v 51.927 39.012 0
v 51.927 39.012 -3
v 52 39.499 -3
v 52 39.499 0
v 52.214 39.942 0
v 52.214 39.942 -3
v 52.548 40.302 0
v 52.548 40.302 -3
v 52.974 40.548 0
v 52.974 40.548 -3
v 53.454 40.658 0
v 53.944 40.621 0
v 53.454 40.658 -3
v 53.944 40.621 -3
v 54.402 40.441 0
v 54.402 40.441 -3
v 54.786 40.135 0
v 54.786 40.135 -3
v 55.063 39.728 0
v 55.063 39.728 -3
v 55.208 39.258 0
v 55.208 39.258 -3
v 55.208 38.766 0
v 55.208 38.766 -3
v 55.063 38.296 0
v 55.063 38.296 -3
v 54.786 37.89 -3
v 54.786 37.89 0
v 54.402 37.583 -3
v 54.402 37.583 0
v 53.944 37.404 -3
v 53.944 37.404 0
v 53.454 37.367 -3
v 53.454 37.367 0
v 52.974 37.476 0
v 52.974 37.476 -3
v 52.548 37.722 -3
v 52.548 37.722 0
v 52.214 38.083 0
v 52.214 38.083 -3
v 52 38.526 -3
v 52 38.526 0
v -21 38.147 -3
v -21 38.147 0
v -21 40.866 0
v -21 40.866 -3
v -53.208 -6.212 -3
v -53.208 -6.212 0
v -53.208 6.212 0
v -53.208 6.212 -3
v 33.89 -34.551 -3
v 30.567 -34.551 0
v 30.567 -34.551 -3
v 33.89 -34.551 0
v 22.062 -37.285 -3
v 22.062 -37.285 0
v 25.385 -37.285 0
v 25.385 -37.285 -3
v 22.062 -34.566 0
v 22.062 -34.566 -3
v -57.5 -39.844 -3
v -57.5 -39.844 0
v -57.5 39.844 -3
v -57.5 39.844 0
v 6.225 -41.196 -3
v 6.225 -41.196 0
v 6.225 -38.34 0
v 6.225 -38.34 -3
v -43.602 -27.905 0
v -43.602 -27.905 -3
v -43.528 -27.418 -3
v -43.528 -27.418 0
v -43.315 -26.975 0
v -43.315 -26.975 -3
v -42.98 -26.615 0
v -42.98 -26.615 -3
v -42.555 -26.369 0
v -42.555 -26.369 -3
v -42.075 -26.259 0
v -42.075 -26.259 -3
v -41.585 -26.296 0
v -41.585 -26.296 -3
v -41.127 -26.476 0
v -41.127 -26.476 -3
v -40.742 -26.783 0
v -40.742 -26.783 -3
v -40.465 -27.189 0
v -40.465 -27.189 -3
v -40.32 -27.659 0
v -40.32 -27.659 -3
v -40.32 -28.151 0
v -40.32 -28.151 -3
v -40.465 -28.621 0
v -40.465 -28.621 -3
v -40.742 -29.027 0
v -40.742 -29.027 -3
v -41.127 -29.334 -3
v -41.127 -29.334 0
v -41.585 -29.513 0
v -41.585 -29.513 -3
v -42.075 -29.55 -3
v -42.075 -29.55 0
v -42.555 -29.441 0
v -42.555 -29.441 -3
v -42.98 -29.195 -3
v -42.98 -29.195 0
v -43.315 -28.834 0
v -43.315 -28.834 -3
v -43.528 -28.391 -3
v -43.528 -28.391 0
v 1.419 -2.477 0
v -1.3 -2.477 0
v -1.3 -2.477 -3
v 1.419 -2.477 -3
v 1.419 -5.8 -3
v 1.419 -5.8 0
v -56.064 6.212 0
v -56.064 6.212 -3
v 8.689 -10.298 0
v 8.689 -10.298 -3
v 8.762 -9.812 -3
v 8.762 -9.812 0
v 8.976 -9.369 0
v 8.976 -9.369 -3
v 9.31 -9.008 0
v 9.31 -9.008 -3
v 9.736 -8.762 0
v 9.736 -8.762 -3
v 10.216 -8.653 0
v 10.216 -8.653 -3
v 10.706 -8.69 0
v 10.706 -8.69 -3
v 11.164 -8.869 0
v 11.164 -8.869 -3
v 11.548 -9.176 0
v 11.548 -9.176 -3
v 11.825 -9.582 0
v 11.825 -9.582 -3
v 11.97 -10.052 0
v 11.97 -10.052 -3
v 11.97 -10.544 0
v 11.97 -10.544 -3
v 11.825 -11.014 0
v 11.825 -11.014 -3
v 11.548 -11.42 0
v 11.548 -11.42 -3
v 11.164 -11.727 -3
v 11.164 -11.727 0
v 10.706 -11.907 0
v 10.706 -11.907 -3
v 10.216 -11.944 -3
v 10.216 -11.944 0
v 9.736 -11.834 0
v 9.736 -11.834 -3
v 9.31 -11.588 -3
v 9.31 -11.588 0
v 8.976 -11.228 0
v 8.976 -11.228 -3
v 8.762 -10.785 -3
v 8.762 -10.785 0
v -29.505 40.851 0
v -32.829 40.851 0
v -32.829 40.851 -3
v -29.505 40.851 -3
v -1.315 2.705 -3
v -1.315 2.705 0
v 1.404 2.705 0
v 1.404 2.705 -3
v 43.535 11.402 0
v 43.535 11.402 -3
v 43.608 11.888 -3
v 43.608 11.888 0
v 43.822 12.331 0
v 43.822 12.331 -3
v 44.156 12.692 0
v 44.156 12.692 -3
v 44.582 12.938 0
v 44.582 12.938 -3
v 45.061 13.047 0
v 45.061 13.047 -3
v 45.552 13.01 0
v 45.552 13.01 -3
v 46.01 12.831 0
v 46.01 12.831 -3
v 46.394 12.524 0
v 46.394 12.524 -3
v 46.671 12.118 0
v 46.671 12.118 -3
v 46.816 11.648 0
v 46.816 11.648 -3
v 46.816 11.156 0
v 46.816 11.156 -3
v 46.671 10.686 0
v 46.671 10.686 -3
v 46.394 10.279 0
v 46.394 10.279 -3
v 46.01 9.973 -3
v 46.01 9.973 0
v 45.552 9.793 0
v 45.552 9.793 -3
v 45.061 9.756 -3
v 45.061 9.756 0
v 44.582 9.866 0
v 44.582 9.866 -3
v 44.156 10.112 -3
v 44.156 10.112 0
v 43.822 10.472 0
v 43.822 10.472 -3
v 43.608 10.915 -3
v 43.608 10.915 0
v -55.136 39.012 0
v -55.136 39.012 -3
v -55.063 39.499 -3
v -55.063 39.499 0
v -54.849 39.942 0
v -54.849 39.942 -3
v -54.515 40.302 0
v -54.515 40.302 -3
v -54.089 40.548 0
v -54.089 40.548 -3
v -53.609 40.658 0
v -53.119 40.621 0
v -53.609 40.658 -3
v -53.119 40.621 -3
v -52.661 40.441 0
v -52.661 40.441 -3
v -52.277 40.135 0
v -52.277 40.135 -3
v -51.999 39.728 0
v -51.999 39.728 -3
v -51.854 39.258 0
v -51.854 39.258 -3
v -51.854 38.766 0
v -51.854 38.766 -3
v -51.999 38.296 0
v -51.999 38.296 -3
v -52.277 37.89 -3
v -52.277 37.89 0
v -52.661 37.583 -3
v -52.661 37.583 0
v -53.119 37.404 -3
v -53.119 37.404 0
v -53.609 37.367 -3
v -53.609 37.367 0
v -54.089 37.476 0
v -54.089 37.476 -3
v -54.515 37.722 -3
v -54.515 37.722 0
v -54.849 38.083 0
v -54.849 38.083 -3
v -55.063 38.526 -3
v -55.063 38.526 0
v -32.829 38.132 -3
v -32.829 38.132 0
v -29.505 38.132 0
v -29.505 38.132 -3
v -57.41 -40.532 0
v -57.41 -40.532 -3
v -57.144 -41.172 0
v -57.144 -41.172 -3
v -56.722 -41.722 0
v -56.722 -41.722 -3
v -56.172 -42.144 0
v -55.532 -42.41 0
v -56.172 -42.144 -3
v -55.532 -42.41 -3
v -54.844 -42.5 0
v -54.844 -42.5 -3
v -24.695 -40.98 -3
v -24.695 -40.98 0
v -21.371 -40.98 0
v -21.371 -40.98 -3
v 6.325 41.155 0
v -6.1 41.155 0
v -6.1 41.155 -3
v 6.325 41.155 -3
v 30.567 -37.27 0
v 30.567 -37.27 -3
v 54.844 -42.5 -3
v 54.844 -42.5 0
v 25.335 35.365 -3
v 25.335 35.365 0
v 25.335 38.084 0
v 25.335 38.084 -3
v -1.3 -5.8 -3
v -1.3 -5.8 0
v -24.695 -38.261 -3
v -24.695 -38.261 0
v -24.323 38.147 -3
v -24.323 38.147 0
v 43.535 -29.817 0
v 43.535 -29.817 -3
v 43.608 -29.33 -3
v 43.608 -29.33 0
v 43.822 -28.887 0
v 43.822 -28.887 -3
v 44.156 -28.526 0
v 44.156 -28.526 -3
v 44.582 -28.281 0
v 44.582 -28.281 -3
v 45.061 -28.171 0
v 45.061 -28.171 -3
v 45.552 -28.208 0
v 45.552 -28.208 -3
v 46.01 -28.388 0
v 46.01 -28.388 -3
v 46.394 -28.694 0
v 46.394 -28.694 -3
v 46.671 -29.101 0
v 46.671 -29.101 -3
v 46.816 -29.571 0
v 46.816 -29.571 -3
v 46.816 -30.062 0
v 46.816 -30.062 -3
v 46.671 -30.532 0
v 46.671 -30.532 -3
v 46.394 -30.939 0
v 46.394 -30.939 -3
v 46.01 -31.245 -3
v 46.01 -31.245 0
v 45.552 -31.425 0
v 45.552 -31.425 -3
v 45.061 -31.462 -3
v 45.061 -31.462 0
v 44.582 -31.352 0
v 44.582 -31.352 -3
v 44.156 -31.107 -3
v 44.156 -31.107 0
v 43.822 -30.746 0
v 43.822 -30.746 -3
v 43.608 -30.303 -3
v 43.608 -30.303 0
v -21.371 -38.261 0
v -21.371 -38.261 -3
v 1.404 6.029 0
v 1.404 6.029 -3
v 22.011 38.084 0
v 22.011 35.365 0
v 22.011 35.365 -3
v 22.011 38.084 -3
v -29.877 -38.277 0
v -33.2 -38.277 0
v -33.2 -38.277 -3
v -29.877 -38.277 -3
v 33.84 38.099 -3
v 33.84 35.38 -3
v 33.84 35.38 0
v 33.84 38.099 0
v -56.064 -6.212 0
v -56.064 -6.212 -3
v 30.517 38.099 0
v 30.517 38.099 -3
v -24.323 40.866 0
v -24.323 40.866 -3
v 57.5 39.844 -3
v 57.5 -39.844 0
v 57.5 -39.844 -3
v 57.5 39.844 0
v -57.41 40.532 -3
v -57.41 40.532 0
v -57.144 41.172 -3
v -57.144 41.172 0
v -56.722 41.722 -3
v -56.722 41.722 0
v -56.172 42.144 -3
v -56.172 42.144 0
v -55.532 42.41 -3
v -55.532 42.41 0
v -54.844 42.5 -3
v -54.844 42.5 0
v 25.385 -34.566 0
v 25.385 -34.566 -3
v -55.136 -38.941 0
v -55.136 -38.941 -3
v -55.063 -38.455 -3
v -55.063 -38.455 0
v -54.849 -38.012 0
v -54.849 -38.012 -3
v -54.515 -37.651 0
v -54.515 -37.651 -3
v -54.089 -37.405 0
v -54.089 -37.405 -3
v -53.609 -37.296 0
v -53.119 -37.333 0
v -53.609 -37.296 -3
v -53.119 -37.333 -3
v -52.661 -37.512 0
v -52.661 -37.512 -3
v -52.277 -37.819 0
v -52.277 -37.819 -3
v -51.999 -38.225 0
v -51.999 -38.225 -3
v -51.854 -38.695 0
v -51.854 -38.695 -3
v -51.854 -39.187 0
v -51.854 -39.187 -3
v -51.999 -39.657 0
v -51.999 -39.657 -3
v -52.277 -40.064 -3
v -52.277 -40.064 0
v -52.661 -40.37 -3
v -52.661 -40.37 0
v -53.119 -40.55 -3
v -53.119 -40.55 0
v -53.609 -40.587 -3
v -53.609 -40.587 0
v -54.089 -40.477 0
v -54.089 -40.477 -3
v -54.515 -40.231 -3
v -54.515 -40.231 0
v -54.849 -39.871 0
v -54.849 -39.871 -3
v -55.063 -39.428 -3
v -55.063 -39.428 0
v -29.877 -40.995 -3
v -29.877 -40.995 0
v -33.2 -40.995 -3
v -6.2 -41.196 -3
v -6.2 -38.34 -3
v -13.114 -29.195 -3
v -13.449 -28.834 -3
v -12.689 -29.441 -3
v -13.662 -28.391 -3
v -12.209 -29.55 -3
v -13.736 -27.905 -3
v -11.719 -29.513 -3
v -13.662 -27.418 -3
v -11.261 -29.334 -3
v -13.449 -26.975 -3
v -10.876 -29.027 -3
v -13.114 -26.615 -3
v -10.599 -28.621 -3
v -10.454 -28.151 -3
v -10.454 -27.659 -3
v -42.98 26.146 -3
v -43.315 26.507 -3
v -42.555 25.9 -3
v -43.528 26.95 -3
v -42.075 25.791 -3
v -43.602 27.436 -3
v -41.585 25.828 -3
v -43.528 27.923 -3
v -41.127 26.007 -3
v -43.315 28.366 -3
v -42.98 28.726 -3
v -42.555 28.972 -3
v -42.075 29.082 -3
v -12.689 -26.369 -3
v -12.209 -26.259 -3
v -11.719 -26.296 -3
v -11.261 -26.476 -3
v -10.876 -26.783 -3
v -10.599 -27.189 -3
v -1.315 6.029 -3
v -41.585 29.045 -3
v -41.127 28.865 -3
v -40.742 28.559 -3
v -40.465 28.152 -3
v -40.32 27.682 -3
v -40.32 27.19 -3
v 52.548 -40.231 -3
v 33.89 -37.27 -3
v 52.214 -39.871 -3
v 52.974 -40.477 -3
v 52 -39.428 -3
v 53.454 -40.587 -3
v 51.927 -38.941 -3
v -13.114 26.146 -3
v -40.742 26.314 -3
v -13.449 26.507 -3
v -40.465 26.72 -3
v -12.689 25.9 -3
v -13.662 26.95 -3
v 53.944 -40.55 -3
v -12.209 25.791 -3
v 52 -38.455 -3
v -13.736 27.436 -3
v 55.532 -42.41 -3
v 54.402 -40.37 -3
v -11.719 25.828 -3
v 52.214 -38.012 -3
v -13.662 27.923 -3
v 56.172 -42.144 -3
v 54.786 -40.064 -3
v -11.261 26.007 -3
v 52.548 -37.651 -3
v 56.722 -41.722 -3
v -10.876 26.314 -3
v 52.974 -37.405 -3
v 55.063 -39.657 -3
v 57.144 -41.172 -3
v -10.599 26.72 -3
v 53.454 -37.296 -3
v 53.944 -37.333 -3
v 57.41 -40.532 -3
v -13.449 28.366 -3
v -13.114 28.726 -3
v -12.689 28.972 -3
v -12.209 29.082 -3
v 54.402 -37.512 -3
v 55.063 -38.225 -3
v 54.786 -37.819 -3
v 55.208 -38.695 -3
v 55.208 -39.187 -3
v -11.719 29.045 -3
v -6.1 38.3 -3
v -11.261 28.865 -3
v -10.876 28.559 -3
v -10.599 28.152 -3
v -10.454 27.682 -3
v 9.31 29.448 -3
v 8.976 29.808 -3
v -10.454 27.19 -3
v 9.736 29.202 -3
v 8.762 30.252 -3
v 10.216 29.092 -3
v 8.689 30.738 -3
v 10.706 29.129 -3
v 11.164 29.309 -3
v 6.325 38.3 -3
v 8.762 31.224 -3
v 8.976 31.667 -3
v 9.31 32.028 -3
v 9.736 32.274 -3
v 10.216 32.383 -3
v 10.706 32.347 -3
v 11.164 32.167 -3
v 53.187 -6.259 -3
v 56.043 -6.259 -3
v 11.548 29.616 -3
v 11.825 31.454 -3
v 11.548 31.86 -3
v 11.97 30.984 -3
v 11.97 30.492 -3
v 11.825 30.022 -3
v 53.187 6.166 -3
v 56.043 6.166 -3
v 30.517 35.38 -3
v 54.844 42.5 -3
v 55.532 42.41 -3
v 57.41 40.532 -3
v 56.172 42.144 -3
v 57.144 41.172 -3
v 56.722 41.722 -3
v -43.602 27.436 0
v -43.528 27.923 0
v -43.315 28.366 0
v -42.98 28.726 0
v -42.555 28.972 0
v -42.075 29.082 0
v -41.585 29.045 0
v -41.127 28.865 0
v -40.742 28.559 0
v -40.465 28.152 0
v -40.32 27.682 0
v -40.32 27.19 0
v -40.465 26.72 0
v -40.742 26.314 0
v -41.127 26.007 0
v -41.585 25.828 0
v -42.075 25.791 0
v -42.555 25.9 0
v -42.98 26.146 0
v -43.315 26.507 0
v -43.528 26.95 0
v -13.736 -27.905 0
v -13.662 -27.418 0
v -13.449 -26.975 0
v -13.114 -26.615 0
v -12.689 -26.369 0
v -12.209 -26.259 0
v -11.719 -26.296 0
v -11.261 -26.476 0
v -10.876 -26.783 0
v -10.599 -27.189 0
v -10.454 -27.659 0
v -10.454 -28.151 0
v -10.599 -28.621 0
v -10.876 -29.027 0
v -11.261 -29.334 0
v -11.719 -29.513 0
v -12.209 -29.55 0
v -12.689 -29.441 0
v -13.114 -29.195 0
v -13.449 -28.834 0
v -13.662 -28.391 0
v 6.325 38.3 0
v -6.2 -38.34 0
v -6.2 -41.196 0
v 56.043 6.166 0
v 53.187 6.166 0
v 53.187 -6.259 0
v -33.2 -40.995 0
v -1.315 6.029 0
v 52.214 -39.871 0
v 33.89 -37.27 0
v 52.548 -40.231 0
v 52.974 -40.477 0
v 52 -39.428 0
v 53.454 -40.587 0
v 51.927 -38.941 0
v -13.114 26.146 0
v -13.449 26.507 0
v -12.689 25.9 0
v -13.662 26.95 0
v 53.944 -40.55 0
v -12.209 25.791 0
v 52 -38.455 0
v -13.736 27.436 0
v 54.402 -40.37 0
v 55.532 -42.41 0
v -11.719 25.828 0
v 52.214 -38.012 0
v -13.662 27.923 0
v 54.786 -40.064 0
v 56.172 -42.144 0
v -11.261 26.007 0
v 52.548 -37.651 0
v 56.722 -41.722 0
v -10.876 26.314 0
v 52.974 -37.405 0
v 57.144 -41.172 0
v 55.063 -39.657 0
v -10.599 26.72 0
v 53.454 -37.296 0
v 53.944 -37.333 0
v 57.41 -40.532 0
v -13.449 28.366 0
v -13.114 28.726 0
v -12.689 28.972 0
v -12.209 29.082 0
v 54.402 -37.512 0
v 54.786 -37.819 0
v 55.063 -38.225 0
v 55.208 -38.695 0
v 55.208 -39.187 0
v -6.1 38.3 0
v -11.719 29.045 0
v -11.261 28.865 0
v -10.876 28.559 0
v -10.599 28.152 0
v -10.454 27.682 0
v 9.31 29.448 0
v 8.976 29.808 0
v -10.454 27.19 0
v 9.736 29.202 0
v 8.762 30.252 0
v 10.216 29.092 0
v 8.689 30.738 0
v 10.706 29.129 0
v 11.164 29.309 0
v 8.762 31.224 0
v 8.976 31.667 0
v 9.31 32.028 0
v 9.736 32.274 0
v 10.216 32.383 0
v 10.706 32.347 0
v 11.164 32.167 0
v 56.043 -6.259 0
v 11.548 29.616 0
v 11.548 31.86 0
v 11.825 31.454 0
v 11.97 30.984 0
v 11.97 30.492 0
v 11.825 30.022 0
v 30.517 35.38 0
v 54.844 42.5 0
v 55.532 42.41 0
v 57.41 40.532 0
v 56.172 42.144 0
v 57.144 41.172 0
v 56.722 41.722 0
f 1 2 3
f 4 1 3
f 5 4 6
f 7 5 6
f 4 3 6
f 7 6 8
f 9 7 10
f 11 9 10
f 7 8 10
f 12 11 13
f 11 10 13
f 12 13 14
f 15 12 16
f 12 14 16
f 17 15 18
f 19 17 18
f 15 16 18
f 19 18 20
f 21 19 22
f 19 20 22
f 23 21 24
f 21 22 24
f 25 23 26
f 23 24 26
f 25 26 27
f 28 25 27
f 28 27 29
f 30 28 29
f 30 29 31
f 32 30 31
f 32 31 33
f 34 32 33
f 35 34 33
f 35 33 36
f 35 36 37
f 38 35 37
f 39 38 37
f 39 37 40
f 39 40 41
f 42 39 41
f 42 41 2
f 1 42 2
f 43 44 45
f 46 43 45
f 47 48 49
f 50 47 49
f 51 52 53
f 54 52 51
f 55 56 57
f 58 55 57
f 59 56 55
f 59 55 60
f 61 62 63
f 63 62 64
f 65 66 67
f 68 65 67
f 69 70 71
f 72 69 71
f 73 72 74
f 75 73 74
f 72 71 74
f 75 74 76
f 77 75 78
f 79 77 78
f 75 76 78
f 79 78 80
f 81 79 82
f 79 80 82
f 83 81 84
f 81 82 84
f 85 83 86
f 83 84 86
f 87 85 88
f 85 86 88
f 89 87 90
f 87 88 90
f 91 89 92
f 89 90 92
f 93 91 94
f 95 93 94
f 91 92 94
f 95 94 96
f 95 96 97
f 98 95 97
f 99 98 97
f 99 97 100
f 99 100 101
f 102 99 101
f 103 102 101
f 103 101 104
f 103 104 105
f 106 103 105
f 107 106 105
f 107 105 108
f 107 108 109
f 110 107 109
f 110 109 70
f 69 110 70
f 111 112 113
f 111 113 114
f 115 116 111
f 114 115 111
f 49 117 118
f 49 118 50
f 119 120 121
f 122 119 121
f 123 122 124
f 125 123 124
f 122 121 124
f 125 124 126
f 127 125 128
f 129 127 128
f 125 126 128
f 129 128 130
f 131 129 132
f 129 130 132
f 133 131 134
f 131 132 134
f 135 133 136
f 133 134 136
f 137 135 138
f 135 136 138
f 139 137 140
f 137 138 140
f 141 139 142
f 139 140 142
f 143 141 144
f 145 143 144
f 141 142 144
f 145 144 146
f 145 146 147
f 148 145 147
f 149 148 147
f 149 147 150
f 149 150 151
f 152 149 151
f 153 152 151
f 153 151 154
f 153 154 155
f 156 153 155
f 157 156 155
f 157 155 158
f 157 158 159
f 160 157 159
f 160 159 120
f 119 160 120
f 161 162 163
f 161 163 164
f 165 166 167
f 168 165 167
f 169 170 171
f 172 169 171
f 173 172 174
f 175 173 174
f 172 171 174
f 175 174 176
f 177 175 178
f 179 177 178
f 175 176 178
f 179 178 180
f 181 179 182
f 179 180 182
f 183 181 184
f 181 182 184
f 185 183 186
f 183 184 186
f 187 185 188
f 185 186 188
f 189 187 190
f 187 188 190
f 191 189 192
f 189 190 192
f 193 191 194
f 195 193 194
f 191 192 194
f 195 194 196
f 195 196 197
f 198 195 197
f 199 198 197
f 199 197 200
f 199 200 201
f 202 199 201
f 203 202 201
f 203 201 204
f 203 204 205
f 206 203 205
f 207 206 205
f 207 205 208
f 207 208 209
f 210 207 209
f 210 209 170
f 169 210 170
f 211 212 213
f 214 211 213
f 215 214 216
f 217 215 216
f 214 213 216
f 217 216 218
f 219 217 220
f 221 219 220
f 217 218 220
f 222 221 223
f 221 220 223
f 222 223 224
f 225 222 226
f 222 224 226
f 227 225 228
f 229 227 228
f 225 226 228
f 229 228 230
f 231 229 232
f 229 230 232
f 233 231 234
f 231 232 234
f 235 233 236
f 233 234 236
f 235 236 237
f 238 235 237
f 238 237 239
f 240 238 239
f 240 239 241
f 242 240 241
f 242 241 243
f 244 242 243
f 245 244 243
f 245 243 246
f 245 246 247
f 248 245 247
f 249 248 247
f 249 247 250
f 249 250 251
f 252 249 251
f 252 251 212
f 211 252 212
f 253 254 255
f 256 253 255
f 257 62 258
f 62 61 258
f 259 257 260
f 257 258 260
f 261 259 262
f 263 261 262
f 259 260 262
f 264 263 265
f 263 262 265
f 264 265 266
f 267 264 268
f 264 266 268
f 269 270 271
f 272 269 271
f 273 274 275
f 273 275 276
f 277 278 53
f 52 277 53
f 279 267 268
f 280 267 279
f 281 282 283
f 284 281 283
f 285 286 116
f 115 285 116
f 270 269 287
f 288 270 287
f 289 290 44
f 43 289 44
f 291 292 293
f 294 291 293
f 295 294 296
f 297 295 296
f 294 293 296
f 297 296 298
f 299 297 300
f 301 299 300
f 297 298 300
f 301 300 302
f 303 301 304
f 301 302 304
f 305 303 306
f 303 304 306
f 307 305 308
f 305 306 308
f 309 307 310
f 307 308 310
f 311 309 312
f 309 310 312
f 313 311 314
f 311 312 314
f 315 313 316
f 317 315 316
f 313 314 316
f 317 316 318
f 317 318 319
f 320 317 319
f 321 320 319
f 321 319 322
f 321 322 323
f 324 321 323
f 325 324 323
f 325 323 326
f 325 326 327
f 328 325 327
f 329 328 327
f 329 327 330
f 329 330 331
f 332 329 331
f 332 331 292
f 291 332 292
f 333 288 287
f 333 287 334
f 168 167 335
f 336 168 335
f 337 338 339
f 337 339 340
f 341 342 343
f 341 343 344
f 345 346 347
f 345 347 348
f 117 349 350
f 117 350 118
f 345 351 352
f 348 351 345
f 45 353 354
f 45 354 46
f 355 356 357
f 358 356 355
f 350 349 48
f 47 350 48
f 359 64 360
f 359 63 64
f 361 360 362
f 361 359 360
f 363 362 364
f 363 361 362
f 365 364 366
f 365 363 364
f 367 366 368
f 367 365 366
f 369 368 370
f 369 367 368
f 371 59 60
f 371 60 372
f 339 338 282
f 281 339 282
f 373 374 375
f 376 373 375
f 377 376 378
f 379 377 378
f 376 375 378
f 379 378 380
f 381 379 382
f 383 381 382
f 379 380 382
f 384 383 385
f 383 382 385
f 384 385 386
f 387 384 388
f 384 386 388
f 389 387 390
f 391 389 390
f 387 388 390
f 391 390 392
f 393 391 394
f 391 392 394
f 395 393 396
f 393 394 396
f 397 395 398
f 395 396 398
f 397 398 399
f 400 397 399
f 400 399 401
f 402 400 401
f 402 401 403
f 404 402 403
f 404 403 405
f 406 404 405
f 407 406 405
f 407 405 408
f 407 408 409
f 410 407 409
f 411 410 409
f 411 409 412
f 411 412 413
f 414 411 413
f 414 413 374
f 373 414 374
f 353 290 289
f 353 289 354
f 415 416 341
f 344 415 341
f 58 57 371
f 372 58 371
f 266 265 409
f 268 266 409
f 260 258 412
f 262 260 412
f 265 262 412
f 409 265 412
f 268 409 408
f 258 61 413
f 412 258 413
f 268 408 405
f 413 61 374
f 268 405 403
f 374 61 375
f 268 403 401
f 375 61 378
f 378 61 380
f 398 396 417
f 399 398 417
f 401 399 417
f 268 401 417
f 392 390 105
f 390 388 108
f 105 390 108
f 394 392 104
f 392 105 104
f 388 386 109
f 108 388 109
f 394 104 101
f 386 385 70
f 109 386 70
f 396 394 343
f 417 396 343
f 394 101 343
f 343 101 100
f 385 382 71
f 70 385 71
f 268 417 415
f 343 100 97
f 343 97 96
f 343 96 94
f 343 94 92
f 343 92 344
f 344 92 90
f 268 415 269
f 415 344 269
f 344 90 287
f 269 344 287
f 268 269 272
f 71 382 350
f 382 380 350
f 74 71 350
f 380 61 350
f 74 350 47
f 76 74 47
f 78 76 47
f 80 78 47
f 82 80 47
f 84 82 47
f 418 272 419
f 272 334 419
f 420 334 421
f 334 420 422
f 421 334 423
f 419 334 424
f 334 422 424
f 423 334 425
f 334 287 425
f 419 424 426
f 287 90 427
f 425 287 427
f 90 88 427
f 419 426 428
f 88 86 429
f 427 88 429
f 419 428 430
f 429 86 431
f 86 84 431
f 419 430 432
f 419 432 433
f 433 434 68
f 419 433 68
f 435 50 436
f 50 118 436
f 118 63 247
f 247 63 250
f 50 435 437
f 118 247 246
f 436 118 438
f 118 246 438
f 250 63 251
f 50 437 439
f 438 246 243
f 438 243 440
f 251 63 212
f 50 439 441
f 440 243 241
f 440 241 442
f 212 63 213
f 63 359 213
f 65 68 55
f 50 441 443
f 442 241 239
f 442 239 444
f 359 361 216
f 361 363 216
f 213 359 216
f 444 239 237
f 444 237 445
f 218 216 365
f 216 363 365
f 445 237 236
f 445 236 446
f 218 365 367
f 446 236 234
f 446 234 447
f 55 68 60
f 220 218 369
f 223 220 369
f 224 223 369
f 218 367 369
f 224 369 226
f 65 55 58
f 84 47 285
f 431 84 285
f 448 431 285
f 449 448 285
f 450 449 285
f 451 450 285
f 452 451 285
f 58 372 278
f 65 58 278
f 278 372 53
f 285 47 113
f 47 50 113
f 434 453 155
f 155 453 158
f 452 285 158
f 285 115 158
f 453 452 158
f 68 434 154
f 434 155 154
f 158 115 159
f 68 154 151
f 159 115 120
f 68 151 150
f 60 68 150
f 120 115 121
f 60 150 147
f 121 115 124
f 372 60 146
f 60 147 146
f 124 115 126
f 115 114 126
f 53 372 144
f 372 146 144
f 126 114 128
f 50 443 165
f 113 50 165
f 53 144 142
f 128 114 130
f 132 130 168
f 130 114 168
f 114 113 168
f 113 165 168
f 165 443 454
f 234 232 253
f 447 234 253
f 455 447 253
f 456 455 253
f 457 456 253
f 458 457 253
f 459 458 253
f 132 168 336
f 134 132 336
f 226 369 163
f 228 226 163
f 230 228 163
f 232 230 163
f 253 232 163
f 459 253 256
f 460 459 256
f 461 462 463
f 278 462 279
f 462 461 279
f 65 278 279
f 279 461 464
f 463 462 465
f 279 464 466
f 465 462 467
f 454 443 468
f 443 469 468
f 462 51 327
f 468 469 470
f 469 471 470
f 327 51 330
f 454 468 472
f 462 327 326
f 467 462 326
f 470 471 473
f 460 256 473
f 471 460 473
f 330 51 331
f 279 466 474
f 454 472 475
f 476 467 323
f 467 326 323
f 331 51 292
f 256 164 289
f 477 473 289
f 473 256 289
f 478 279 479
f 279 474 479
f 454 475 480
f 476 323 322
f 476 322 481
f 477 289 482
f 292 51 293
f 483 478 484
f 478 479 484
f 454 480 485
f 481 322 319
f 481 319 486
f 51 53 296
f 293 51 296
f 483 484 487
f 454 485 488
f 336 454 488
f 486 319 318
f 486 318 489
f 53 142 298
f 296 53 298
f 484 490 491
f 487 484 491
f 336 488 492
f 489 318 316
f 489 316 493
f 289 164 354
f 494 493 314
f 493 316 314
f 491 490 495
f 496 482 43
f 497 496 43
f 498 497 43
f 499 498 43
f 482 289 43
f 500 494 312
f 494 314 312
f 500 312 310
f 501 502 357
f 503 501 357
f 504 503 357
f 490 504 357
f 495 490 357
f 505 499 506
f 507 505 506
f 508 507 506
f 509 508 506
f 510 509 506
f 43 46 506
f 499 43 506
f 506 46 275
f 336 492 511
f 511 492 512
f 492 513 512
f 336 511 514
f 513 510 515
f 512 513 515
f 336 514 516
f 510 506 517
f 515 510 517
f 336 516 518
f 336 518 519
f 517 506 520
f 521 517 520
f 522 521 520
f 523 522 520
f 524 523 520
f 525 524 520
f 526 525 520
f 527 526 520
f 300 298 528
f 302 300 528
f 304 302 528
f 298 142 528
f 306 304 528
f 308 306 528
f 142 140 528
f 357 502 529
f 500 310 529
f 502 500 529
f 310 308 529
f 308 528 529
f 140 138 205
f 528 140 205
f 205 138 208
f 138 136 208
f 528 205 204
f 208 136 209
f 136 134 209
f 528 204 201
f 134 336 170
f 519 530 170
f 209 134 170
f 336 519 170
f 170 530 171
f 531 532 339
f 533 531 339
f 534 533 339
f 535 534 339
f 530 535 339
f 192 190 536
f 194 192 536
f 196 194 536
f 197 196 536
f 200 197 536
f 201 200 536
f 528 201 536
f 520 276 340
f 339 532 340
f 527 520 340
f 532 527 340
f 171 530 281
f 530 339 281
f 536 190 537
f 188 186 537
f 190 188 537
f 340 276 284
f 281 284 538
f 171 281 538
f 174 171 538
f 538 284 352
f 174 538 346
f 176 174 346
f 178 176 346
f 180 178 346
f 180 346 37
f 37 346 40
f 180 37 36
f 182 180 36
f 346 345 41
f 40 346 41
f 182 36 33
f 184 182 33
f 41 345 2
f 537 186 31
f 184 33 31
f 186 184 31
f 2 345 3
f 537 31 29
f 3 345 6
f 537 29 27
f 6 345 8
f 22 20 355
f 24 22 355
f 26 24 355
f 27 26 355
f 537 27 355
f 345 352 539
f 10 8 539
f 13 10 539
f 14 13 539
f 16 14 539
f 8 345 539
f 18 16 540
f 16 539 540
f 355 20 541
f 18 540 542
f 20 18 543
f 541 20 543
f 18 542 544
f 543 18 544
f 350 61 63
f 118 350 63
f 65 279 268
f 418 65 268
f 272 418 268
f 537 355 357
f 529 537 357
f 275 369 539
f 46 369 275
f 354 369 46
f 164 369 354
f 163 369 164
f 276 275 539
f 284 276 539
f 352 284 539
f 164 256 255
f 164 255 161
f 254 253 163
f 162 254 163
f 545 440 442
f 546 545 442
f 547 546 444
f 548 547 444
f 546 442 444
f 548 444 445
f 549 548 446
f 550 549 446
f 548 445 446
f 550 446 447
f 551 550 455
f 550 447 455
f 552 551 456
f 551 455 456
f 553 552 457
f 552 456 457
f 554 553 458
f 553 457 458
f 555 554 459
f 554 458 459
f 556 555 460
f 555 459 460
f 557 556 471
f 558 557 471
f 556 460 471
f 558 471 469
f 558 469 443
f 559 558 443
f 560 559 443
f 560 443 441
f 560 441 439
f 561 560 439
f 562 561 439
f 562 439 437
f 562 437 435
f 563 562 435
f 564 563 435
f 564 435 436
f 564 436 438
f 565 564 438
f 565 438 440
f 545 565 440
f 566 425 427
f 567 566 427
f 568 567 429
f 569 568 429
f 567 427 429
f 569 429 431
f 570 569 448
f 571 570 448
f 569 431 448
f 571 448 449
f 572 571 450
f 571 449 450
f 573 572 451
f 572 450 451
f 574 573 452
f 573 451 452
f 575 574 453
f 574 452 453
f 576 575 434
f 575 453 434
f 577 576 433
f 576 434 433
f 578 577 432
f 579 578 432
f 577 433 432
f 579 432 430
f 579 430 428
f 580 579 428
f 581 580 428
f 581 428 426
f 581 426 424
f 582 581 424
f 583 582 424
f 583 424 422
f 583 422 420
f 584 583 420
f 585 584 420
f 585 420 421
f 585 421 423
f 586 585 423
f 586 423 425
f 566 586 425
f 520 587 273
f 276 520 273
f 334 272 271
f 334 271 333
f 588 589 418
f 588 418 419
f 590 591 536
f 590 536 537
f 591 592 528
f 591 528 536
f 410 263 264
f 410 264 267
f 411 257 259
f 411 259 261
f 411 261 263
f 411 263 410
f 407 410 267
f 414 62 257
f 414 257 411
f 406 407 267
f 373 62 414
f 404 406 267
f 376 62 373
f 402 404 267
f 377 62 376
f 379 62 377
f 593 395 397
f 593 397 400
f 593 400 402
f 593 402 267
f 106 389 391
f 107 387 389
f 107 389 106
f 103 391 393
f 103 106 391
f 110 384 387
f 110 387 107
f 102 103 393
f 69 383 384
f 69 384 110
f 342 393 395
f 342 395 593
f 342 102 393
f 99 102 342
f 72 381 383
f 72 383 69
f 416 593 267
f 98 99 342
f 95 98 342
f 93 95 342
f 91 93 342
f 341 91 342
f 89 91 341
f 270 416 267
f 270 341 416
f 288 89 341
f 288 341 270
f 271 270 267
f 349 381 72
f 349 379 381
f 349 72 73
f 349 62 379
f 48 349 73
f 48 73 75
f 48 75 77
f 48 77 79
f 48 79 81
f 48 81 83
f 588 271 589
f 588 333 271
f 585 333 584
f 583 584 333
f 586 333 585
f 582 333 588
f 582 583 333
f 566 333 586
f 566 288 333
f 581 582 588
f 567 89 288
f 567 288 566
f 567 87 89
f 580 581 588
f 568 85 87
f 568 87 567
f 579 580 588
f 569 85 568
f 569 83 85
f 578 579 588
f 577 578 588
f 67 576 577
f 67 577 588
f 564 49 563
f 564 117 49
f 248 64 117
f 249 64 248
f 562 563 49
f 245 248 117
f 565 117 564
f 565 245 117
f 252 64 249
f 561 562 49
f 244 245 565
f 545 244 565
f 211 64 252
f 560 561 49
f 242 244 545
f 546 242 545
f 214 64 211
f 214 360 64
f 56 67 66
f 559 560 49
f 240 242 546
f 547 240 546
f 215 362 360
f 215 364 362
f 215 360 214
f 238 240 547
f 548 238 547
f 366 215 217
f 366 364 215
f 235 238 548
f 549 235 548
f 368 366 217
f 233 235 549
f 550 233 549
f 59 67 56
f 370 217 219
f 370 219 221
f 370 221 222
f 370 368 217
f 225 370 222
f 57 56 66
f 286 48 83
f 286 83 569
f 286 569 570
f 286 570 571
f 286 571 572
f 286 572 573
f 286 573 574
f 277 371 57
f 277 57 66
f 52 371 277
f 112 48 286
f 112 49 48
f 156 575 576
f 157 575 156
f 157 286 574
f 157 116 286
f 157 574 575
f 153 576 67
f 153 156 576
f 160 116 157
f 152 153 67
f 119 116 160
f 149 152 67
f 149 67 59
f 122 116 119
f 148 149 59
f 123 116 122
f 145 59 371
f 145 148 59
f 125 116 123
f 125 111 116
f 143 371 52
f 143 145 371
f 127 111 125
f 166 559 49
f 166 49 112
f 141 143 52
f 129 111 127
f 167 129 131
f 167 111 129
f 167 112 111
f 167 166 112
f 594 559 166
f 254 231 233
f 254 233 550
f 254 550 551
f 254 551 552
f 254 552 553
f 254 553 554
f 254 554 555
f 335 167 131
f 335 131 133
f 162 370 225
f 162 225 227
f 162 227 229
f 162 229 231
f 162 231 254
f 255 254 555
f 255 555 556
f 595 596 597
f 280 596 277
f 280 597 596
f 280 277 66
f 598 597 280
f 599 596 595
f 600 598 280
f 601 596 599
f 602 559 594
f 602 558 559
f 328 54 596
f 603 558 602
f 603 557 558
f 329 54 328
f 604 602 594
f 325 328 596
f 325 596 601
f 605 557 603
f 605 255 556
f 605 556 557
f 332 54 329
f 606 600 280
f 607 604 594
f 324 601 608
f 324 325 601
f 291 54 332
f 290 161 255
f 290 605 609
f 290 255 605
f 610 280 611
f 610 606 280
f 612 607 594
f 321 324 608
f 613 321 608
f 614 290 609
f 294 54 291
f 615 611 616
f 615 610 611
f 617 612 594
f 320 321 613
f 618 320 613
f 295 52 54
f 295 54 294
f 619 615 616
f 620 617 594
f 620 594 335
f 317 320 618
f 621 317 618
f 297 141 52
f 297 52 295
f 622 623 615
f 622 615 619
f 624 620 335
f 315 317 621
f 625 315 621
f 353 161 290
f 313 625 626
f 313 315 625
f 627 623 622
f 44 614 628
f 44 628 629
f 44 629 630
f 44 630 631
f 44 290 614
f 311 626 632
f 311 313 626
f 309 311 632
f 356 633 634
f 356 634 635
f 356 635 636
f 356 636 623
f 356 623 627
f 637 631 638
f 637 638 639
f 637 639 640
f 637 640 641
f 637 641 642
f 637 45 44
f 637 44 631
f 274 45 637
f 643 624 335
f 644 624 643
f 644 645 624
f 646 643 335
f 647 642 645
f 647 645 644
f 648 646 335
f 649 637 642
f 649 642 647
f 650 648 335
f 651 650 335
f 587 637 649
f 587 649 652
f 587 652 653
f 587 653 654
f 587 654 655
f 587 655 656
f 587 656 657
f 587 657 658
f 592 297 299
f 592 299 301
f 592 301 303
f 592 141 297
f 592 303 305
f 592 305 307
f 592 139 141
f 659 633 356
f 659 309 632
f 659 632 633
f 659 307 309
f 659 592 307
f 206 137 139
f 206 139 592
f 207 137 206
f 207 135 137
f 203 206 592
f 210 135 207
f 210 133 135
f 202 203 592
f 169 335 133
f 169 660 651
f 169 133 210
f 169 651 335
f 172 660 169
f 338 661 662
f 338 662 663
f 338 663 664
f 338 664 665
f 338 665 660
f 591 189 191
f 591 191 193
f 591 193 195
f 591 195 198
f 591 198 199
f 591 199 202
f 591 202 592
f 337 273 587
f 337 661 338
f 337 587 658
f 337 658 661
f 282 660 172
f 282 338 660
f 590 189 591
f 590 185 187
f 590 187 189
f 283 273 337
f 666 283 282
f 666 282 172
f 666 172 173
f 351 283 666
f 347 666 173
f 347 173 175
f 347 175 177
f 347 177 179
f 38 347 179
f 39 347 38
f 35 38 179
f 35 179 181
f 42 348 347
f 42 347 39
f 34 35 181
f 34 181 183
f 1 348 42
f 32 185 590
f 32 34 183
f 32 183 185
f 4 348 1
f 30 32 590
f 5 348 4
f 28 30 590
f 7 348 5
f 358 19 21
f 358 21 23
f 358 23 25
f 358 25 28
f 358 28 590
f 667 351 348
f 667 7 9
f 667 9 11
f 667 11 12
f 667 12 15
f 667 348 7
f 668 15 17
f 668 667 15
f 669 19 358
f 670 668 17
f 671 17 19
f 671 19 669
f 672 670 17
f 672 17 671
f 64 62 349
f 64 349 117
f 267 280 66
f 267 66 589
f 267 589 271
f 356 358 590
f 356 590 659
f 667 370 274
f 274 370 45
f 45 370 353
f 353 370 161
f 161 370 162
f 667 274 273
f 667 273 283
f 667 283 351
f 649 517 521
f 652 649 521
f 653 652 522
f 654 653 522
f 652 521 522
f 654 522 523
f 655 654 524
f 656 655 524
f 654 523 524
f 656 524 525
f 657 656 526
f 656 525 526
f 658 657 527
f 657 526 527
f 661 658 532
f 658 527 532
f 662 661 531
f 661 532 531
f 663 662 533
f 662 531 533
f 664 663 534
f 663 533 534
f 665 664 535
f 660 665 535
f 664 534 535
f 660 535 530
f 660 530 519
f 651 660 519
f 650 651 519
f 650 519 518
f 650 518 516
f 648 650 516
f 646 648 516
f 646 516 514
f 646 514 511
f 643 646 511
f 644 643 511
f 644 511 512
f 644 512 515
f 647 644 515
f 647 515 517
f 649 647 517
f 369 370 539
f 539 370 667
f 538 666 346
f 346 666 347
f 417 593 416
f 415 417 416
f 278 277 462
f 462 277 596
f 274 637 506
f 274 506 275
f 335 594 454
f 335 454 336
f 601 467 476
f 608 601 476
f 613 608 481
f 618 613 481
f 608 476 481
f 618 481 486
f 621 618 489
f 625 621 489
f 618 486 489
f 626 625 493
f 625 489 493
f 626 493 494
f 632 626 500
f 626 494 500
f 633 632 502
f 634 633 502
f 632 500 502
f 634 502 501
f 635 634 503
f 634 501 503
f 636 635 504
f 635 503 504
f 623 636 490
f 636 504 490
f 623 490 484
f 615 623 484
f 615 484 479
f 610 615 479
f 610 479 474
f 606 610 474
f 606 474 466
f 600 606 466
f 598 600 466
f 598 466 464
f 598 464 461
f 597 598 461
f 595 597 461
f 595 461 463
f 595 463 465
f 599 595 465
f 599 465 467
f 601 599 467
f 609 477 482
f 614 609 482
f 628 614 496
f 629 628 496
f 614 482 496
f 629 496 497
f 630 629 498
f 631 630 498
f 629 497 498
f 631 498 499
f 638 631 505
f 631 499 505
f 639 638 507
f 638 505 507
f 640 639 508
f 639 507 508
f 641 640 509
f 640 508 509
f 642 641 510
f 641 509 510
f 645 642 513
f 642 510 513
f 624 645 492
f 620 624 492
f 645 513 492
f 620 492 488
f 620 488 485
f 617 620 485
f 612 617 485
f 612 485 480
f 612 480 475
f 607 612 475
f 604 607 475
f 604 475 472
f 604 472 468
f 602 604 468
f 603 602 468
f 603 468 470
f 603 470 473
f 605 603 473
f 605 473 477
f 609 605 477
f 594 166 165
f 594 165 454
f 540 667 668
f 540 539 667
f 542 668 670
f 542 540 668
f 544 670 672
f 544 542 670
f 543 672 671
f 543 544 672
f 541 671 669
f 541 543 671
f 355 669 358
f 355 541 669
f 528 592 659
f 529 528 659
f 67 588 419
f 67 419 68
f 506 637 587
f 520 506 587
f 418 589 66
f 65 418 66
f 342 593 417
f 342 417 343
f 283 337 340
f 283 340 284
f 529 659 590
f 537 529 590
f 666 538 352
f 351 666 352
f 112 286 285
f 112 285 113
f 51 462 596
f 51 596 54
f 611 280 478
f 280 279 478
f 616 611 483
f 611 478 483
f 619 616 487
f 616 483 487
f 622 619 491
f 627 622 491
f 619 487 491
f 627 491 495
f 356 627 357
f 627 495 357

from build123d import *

# Parameters (mm, degrees)
F0_W     = 115
F0_H     = 85
F0_W_2   = 3.3230667468
F0_H_2   = 2.7188727399
F0_W_3   = 12.42488157
F0_H_3   = 2.8554350138
F0_W_4   = 2.7188727399
F0_H_4   = 3.3230667468
F0_W_5   = 2.8554350138
F0_H_5   = 12.42488157
F1_DEPTH = 3
F2_R     = 2.6556349186
F3_D     = 3.3
F3_DEPTH = 13.5
F3_TIP   = 0.9914200214
F4_D     = 3.3


with BuildPart() as f1:
    # F0 (on Top) → F1 (new body)
    with BuildSketch(Plane.XY):
        Rectangle(F0_W, F0_H)
        with Locations((-31.5384735586, -39.6359708975)):
            Rectangle(F0_W_2, F0_H_2, mode=Mode.SUBTRACT)
        with Locations((-23.0330330087, -39.6208088496)):
            Rectangle(F0_W_2, F0_H_2, mode=Mode.SUBTRACT)
        with Locations((0.012440607, -39.7679619491)):
            Rectangle(F0_W_3, F0_H_3, mode=Mode.SUBTRACT)
        with Locations((23.7232622458, -35.9257351956)):
            Rectangle(F0_W_2, F0_H_2, mode=Mode.SUBTRACT)
        with Locations((32.2287027957, -35.9105731477)):
            Rectangle(F0_W_2, F0_H_2, mode=Mode.SUBTRACT)
        with Locations((0.0594367157, -4.1384646902)):
            Rectangle(F0_W_4, F0_H_4, mode=Mode.SUBTRACT)
        with Locations((54.6148940921, -0.0461908057)):
            Rectangle(F0_W_5, F0_H_5, mode=Mode.SUBTRACT)
        with Locations((-54.6360462904, 0)):
            Rectangle(F0_W_5, F0_H_5, mode=Mode.SUBTRACT)
        with Locations((-31.1669755029, 39.4913438358)):
            Rectangle(F0_W_2, F0_H_2, mode=Mode.SUBTRACT)
        with Locations((-22.6615349529, 39.5065058838)):
            Rectangle(F0_W_2, F0_H_2, mode=Mode.SUBTRACT)
        with Locations((0.0442746677, 4.3669758597)):
            Rectangle(F0_W_4, F0_H_4, mode=Mode.SUBTRACT)
        with Locations((0.1124413684, 39.7277288139)):
            Rectangle(F0_W_3, F0_H_3, mode=Mode.SUBTRACT)
        with Locations((23.6730267061, 36.7241497734)):
            Rectangle(F0_W_2, F0_H_2, mode=Mode.SUBTRACT)
        with Locations((32.178467256, 36.7393118213)):
            Rectangle(F0_W_2, F0_H_2, mode=Mode.SUBTRACT)
    extrude(amount=-F1_DEPTH)

    # F2
    f2_edges = [f1.edges().sort_by_distance(p)[0] for p in [
        (57.5, -42.5, -1.5),
        (57.5, 42.5, -1.5),
        (-57.5, -42.5, -1.5),
        (-57.5, 42.5, -1.5),
    ]]
    fillet(f2_edges, radius=F2_R)

    # F3
    with Locations(Plane.XY):
        with Locations((-53.4860491753, -38.9412779514), (-53.4860491753, 39.0123836696), (53.5768903792, -38.9412779514), (53.5768903792, 39.0123836696)):
            Hole(F3_D / 2, depth=F3_DEPTH)
            with Locations((0, 0, -(F3_DEPTH + F3_TIP / 2))):  # 118° drill point
                Cone(0, F3_D / 2, F3_TIP, mode=Mode.SUBTRACT)

    # F4 (through all)
    with Locations(Plane.XY):
        with Locations((-41.9517233968, 27.4363141507), (-12.0857078582, 27.4363141507), (-12.0857078582, -27.9048345983), (10.3388316929, 30.7378862053), (45.184802264, 11.4016206935), (45.184802264, -29.8165101558), (10.3388316929, -10.2981757373), (-41.9517233968, -27.9048345983)):
            Hole(F4_D / 2)


solid = f1.part
